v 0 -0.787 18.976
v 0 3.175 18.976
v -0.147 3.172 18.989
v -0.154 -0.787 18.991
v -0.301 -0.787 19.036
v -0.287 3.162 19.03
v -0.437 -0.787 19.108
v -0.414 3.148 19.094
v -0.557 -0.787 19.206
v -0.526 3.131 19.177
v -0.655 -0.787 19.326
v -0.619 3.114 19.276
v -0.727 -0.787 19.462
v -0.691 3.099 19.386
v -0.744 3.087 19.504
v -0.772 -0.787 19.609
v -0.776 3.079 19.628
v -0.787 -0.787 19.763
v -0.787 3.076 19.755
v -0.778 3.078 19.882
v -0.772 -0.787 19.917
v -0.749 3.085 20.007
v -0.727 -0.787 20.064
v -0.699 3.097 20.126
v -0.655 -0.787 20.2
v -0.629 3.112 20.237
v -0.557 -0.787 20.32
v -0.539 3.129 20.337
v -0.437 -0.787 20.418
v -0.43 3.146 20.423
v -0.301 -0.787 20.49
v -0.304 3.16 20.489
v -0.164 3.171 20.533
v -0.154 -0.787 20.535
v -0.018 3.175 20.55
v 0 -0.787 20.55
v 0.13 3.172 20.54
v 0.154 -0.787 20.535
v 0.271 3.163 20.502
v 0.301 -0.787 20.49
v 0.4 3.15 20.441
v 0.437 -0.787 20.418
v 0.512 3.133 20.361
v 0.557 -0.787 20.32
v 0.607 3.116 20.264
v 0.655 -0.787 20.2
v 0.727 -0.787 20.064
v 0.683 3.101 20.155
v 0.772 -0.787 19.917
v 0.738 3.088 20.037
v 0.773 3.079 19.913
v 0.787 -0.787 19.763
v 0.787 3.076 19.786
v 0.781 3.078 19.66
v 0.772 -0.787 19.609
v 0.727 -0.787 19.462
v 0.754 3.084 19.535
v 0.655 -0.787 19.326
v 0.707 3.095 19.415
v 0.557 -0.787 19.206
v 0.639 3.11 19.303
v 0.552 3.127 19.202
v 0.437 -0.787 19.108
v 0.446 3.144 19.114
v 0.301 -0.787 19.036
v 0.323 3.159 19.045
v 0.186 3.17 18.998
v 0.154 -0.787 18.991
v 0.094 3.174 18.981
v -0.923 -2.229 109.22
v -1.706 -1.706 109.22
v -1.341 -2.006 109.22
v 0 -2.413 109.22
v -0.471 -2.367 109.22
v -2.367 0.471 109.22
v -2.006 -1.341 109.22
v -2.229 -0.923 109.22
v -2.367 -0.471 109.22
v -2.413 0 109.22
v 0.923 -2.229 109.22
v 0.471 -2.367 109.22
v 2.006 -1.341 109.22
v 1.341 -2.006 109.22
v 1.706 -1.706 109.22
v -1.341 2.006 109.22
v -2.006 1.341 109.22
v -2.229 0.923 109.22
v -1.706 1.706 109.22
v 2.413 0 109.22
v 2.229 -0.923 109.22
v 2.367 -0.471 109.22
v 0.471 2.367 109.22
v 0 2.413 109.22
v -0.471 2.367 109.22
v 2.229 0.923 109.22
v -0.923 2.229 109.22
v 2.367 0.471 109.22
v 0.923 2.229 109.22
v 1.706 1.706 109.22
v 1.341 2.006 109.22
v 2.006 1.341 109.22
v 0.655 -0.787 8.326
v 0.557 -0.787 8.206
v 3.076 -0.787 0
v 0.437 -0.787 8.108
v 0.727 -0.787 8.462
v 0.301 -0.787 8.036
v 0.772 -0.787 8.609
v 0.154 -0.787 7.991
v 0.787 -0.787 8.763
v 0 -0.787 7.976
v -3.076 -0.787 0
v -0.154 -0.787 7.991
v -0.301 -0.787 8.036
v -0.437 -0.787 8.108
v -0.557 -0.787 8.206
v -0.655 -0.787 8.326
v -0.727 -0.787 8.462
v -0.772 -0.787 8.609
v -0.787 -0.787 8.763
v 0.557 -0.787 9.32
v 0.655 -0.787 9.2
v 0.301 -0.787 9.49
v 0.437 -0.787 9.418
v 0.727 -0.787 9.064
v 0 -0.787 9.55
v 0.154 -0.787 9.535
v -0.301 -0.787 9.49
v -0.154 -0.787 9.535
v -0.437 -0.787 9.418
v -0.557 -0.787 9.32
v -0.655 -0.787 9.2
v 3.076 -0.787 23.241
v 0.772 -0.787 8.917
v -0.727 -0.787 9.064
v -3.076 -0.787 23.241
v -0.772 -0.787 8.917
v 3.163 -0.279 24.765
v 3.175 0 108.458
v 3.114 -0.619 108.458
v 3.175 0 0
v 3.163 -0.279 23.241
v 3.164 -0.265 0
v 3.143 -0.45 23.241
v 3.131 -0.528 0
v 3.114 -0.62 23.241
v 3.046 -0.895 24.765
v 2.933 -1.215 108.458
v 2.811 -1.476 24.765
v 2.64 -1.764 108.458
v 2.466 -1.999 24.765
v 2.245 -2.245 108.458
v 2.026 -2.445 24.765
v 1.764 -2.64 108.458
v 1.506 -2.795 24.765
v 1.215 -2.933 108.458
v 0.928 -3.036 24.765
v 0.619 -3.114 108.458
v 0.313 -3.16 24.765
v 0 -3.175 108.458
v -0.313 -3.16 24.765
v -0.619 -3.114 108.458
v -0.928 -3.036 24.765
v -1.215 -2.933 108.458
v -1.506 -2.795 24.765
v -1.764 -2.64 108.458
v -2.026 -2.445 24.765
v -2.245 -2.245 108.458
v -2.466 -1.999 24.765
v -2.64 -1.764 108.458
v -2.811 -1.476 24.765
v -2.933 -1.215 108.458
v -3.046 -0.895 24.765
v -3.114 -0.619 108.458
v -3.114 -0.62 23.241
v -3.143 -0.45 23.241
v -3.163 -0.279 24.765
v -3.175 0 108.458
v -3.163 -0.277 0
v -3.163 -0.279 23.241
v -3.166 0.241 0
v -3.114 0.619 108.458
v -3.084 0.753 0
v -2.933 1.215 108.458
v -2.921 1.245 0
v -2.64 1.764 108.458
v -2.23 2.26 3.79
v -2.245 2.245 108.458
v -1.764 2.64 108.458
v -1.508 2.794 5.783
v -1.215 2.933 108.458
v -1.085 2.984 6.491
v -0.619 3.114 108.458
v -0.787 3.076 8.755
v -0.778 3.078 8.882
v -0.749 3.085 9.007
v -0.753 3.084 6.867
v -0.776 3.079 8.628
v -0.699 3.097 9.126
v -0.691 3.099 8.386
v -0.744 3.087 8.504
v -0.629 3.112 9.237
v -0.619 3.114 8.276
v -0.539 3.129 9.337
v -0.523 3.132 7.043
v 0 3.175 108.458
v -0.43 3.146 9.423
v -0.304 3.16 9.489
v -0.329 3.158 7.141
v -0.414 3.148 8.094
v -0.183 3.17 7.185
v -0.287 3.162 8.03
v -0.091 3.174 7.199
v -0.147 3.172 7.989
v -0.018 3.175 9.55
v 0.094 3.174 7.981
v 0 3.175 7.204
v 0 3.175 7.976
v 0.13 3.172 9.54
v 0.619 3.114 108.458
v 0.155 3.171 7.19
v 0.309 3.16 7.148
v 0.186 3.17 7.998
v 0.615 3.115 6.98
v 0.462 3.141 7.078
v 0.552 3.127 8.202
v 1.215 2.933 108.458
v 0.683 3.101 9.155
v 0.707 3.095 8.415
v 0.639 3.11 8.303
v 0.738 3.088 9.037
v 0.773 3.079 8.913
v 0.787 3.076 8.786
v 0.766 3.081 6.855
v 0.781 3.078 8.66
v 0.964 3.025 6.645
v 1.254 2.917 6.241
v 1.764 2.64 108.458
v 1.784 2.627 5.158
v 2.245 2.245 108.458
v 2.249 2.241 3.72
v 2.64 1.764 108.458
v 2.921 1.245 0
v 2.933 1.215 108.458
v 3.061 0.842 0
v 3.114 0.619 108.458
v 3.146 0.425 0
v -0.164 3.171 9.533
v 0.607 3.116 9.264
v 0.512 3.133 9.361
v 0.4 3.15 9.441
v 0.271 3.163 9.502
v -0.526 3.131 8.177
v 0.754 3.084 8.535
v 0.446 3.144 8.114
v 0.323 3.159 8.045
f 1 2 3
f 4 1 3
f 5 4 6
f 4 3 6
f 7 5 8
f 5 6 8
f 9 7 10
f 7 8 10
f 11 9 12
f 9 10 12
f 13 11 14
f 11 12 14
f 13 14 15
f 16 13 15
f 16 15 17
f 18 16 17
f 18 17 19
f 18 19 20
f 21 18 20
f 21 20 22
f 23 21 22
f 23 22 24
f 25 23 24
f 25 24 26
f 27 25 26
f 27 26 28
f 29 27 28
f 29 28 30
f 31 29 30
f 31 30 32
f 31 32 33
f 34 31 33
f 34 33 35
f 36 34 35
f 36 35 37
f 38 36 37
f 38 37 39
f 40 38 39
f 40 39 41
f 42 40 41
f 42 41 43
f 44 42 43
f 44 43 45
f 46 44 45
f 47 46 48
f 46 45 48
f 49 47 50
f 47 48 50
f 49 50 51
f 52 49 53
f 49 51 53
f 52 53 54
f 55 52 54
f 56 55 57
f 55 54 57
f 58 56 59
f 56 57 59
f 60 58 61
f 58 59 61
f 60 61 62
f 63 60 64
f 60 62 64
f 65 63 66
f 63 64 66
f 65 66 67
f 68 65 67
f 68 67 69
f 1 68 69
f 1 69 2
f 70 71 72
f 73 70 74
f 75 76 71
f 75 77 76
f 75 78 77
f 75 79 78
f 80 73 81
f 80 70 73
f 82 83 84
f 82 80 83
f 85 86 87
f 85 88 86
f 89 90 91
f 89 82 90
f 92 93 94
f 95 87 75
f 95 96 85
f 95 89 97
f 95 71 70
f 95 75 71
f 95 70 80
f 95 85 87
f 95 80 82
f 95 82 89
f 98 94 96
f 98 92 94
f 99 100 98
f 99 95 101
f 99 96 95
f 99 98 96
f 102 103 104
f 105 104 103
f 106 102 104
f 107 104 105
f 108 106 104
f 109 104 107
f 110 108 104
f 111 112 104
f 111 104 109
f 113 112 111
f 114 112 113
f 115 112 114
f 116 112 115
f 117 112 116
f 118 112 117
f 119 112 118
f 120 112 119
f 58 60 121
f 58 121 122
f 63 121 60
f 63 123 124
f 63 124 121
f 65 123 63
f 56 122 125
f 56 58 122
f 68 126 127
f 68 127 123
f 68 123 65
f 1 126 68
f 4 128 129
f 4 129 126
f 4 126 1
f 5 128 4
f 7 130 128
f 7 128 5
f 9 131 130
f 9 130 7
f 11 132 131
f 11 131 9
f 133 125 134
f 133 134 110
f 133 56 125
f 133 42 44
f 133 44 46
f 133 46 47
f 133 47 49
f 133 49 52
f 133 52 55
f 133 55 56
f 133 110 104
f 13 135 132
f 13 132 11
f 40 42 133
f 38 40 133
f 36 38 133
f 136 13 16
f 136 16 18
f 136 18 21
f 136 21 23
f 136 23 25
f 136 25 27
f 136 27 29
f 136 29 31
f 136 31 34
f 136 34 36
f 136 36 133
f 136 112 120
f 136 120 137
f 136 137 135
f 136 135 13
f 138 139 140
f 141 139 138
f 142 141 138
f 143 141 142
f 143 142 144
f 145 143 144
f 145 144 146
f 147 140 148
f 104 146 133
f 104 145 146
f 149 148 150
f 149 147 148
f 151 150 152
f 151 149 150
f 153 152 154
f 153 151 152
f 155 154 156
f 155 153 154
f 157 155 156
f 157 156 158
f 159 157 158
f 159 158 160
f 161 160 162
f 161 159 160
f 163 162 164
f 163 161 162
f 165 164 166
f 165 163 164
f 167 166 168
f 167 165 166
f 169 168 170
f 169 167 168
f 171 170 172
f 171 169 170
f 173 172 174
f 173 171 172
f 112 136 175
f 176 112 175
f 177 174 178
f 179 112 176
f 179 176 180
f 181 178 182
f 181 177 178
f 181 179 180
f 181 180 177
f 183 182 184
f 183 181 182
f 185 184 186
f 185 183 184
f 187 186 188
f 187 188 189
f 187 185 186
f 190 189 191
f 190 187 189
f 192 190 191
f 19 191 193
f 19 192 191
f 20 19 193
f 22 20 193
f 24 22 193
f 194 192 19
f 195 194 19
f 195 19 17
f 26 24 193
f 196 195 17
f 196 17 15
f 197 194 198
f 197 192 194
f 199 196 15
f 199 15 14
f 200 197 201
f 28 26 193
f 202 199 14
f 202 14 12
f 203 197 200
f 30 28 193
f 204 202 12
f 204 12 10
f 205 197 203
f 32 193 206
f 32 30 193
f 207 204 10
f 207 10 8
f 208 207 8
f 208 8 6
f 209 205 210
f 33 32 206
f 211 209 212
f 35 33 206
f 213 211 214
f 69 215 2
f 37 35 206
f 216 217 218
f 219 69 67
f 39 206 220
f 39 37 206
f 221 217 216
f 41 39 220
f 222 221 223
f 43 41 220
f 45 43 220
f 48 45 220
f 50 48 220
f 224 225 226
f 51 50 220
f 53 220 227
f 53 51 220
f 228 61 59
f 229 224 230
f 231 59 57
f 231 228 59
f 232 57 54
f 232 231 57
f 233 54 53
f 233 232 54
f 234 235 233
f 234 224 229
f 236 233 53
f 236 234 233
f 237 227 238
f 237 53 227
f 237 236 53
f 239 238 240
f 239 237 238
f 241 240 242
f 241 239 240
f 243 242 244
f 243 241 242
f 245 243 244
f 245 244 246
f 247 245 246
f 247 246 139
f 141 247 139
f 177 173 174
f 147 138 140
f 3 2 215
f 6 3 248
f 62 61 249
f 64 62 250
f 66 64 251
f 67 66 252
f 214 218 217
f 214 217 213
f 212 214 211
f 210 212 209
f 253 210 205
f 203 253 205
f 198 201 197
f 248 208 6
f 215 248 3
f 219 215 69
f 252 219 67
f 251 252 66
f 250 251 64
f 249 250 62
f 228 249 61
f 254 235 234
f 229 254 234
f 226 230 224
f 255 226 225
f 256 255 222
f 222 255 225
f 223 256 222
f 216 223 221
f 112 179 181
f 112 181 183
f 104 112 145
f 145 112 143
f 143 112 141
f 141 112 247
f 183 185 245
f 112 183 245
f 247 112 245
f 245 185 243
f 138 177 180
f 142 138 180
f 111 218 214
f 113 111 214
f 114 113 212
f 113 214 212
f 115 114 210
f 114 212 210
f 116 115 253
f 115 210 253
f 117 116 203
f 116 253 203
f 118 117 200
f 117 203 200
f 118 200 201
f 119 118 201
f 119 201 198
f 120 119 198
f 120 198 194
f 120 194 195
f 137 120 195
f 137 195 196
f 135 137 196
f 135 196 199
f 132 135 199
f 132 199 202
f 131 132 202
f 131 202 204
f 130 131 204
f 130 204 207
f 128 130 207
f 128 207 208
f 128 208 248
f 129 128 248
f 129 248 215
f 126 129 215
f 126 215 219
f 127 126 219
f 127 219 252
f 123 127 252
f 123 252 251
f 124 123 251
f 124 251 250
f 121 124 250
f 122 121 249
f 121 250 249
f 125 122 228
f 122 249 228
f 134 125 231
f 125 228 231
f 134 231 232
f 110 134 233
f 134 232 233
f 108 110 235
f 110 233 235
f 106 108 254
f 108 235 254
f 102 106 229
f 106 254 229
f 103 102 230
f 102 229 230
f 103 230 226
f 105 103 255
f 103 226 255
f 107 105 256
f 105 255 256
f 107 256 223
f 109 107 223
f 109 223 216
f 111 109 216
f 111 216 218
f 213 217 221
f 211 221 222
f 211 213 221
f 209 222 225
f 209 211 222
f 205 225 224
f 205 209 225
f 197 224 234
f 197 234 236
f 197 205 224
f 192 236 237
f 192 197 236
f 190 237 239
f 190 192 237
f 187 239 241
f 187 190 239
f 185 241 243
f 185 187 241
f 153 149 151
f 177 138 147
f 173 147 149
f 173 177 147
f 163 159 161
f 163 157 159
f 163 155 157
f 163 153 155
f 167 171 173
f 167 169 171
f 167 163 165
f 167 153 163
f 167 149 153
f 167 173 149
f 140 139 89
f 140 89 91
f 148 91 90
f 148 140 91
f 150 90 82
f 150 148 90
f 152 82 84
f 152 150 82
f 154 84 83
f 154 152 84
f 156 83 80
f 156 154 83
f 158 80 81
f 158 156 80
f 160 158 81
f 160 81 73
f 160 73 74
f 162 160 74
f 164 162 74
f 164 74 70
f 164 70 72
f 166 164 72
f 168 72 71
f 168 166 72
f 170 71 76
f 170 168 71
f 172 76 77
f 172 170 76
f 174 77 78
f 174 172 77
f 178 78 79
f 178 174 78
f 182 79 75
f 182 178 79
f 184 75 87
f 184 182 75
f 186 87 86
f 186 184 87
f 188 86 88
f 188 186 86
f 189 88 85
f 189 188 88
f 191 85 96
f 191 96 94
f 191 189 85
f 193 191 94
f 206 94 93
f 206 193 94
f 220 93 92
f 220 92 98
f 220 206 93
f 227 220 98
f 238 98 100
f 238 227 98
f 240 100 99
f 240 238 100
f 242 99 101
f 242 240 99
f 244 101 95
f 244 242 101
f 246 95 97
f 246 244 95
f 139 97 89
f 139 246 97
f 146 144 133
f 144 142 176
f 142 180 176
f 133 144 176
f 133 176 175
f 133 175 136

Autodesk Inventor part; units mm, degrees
ref_plane "YZ Plane" through (0, 0, 0) normal (1, 0, 0) x (0, 1, 0)
ref_plane "XZ Plane" through (0, 0, 0) normal (0, 1, 0) x (-1, 0, 0)
ref_plane "XY Plane" through (0, 0, 0) normal (0, 0, 1) x (1, 0, 0)
sketch "Sketch1" plane through (0, 0, 0) normal (0, 0, 1) x (1, 0, 0)
  point P0 (0, 0)
sketch "Sketch2" plane through (0, 0, 0) normal (0, 0, 1) x (1, 0, 0)
  line L0 (0, 4.445) -> (0, -4.445) projected
  line L1 (-4.445, 0) -> (4.445, 0) projected
  circle A0 centre (0, 0) radius 3.175
  dimension "d0" = 6.35
extrude "Extrusion1" add sketch "Sketch2" along normal blind 109.22
sketch "Sketch3" plane through (0, 0, 0) normal (1, 0, 0) x (0, 1, 0)
  line L0 (0, 29.718) -> (0, -4.953) projected
  line L1 (-4.445, 0) -> (4.445, 0) projected
  line L2 (-3.175, 0) -> (3.175, 0) projected
  line L3 (-3.175, 0) -> (-0.7874, 0)
  line L4 (-0.7874, 0) -> (-0.7874, 24.765)
  line L5 (-0.7874, 24.765) -> (-3.175, 24.765)
  line L6 (-3.175, 24.765) -> (-3.175, 0)
  line L7 (-0.7874, 24.765) -> (-0.2794, 24.765)
  line L8 (-0.2794, 24.765) -> (-0.2794, 23.241)
  line L9 (-0.2794, 23.241) -> (-0.7874, 23.241)
  line L10 (-0.7874, 23.241) -> (-0.7874, 24.765)
  point P0 (0, 0)
  dimension "d3" = 24.765
  dimension "d4" = 0.508
  dimension "d5" = 1.524
  dimension "d6" = 3.9624
extrude "Extrusion2" cut sketch "Sketch3" along normal mid plane 25.4
sketch "Sketch4" plane through (0, -0.7874, -0.635) normal (0, 1, 0) x (-1, 0, 0)
  line L0 (-3.0758, 0.635) -> (3.0758, 0.635) projected
  line L1 (0, -21.209) -> (0, 131.699) projected
  line L2 (3.1627, 25.4) -> (-3.1627, 25.4) projected
  point P0 (0, 0.635)
  point P1 (0, 9.398)
  point P2 (3.1627, 25.4)
  point P3 (-3.1627, 25.4)
  point P4 (0, 20.398)
  dimension "d13" = 16.002
  dimension "d14" = 11
hole "Hole1" at (0, -0.7874, 8.763) at (0, -0.7874, 19.763) direction (0, 1, 0) diameter 1.5748 end through all
chamfer "Chamfer1" distance 0.762 angle 45 1 edges at (-3.175, 0, 109.22)
sketch "Sketch5" plane through (0, 0, 0) normal (1, 0, 0) x (0, 1, 0)
  line L0 (3.175, 0) -> (3.175, 108.458) projected
  line L1 (-1.5799, 0) -> (3.9675, 0) projected
  line L2 (3.175, 0) -> (3.175, 7.2044)
  line L3 (3.175, 7.2044) -> (1.2446, 0)
  line L4 (-0.7874, 0) -> (3.175, 0) projected
  line L5 (1.2446, 0) -> (3.175, 0)
  line L6 (-0.7874, 0) -> (-0.7874, 23.241) projected
  point P0 (0, 0)
  dimension "d22" = 1.9304
  dimension "d26" = 2.032
  dimension "d27" = 15
extrude "Extrusion3" cut sketch "Sketch5" along normal mid plane 25.4
properties part number "J007626" material "ALUMINUM, 6061-T651"
